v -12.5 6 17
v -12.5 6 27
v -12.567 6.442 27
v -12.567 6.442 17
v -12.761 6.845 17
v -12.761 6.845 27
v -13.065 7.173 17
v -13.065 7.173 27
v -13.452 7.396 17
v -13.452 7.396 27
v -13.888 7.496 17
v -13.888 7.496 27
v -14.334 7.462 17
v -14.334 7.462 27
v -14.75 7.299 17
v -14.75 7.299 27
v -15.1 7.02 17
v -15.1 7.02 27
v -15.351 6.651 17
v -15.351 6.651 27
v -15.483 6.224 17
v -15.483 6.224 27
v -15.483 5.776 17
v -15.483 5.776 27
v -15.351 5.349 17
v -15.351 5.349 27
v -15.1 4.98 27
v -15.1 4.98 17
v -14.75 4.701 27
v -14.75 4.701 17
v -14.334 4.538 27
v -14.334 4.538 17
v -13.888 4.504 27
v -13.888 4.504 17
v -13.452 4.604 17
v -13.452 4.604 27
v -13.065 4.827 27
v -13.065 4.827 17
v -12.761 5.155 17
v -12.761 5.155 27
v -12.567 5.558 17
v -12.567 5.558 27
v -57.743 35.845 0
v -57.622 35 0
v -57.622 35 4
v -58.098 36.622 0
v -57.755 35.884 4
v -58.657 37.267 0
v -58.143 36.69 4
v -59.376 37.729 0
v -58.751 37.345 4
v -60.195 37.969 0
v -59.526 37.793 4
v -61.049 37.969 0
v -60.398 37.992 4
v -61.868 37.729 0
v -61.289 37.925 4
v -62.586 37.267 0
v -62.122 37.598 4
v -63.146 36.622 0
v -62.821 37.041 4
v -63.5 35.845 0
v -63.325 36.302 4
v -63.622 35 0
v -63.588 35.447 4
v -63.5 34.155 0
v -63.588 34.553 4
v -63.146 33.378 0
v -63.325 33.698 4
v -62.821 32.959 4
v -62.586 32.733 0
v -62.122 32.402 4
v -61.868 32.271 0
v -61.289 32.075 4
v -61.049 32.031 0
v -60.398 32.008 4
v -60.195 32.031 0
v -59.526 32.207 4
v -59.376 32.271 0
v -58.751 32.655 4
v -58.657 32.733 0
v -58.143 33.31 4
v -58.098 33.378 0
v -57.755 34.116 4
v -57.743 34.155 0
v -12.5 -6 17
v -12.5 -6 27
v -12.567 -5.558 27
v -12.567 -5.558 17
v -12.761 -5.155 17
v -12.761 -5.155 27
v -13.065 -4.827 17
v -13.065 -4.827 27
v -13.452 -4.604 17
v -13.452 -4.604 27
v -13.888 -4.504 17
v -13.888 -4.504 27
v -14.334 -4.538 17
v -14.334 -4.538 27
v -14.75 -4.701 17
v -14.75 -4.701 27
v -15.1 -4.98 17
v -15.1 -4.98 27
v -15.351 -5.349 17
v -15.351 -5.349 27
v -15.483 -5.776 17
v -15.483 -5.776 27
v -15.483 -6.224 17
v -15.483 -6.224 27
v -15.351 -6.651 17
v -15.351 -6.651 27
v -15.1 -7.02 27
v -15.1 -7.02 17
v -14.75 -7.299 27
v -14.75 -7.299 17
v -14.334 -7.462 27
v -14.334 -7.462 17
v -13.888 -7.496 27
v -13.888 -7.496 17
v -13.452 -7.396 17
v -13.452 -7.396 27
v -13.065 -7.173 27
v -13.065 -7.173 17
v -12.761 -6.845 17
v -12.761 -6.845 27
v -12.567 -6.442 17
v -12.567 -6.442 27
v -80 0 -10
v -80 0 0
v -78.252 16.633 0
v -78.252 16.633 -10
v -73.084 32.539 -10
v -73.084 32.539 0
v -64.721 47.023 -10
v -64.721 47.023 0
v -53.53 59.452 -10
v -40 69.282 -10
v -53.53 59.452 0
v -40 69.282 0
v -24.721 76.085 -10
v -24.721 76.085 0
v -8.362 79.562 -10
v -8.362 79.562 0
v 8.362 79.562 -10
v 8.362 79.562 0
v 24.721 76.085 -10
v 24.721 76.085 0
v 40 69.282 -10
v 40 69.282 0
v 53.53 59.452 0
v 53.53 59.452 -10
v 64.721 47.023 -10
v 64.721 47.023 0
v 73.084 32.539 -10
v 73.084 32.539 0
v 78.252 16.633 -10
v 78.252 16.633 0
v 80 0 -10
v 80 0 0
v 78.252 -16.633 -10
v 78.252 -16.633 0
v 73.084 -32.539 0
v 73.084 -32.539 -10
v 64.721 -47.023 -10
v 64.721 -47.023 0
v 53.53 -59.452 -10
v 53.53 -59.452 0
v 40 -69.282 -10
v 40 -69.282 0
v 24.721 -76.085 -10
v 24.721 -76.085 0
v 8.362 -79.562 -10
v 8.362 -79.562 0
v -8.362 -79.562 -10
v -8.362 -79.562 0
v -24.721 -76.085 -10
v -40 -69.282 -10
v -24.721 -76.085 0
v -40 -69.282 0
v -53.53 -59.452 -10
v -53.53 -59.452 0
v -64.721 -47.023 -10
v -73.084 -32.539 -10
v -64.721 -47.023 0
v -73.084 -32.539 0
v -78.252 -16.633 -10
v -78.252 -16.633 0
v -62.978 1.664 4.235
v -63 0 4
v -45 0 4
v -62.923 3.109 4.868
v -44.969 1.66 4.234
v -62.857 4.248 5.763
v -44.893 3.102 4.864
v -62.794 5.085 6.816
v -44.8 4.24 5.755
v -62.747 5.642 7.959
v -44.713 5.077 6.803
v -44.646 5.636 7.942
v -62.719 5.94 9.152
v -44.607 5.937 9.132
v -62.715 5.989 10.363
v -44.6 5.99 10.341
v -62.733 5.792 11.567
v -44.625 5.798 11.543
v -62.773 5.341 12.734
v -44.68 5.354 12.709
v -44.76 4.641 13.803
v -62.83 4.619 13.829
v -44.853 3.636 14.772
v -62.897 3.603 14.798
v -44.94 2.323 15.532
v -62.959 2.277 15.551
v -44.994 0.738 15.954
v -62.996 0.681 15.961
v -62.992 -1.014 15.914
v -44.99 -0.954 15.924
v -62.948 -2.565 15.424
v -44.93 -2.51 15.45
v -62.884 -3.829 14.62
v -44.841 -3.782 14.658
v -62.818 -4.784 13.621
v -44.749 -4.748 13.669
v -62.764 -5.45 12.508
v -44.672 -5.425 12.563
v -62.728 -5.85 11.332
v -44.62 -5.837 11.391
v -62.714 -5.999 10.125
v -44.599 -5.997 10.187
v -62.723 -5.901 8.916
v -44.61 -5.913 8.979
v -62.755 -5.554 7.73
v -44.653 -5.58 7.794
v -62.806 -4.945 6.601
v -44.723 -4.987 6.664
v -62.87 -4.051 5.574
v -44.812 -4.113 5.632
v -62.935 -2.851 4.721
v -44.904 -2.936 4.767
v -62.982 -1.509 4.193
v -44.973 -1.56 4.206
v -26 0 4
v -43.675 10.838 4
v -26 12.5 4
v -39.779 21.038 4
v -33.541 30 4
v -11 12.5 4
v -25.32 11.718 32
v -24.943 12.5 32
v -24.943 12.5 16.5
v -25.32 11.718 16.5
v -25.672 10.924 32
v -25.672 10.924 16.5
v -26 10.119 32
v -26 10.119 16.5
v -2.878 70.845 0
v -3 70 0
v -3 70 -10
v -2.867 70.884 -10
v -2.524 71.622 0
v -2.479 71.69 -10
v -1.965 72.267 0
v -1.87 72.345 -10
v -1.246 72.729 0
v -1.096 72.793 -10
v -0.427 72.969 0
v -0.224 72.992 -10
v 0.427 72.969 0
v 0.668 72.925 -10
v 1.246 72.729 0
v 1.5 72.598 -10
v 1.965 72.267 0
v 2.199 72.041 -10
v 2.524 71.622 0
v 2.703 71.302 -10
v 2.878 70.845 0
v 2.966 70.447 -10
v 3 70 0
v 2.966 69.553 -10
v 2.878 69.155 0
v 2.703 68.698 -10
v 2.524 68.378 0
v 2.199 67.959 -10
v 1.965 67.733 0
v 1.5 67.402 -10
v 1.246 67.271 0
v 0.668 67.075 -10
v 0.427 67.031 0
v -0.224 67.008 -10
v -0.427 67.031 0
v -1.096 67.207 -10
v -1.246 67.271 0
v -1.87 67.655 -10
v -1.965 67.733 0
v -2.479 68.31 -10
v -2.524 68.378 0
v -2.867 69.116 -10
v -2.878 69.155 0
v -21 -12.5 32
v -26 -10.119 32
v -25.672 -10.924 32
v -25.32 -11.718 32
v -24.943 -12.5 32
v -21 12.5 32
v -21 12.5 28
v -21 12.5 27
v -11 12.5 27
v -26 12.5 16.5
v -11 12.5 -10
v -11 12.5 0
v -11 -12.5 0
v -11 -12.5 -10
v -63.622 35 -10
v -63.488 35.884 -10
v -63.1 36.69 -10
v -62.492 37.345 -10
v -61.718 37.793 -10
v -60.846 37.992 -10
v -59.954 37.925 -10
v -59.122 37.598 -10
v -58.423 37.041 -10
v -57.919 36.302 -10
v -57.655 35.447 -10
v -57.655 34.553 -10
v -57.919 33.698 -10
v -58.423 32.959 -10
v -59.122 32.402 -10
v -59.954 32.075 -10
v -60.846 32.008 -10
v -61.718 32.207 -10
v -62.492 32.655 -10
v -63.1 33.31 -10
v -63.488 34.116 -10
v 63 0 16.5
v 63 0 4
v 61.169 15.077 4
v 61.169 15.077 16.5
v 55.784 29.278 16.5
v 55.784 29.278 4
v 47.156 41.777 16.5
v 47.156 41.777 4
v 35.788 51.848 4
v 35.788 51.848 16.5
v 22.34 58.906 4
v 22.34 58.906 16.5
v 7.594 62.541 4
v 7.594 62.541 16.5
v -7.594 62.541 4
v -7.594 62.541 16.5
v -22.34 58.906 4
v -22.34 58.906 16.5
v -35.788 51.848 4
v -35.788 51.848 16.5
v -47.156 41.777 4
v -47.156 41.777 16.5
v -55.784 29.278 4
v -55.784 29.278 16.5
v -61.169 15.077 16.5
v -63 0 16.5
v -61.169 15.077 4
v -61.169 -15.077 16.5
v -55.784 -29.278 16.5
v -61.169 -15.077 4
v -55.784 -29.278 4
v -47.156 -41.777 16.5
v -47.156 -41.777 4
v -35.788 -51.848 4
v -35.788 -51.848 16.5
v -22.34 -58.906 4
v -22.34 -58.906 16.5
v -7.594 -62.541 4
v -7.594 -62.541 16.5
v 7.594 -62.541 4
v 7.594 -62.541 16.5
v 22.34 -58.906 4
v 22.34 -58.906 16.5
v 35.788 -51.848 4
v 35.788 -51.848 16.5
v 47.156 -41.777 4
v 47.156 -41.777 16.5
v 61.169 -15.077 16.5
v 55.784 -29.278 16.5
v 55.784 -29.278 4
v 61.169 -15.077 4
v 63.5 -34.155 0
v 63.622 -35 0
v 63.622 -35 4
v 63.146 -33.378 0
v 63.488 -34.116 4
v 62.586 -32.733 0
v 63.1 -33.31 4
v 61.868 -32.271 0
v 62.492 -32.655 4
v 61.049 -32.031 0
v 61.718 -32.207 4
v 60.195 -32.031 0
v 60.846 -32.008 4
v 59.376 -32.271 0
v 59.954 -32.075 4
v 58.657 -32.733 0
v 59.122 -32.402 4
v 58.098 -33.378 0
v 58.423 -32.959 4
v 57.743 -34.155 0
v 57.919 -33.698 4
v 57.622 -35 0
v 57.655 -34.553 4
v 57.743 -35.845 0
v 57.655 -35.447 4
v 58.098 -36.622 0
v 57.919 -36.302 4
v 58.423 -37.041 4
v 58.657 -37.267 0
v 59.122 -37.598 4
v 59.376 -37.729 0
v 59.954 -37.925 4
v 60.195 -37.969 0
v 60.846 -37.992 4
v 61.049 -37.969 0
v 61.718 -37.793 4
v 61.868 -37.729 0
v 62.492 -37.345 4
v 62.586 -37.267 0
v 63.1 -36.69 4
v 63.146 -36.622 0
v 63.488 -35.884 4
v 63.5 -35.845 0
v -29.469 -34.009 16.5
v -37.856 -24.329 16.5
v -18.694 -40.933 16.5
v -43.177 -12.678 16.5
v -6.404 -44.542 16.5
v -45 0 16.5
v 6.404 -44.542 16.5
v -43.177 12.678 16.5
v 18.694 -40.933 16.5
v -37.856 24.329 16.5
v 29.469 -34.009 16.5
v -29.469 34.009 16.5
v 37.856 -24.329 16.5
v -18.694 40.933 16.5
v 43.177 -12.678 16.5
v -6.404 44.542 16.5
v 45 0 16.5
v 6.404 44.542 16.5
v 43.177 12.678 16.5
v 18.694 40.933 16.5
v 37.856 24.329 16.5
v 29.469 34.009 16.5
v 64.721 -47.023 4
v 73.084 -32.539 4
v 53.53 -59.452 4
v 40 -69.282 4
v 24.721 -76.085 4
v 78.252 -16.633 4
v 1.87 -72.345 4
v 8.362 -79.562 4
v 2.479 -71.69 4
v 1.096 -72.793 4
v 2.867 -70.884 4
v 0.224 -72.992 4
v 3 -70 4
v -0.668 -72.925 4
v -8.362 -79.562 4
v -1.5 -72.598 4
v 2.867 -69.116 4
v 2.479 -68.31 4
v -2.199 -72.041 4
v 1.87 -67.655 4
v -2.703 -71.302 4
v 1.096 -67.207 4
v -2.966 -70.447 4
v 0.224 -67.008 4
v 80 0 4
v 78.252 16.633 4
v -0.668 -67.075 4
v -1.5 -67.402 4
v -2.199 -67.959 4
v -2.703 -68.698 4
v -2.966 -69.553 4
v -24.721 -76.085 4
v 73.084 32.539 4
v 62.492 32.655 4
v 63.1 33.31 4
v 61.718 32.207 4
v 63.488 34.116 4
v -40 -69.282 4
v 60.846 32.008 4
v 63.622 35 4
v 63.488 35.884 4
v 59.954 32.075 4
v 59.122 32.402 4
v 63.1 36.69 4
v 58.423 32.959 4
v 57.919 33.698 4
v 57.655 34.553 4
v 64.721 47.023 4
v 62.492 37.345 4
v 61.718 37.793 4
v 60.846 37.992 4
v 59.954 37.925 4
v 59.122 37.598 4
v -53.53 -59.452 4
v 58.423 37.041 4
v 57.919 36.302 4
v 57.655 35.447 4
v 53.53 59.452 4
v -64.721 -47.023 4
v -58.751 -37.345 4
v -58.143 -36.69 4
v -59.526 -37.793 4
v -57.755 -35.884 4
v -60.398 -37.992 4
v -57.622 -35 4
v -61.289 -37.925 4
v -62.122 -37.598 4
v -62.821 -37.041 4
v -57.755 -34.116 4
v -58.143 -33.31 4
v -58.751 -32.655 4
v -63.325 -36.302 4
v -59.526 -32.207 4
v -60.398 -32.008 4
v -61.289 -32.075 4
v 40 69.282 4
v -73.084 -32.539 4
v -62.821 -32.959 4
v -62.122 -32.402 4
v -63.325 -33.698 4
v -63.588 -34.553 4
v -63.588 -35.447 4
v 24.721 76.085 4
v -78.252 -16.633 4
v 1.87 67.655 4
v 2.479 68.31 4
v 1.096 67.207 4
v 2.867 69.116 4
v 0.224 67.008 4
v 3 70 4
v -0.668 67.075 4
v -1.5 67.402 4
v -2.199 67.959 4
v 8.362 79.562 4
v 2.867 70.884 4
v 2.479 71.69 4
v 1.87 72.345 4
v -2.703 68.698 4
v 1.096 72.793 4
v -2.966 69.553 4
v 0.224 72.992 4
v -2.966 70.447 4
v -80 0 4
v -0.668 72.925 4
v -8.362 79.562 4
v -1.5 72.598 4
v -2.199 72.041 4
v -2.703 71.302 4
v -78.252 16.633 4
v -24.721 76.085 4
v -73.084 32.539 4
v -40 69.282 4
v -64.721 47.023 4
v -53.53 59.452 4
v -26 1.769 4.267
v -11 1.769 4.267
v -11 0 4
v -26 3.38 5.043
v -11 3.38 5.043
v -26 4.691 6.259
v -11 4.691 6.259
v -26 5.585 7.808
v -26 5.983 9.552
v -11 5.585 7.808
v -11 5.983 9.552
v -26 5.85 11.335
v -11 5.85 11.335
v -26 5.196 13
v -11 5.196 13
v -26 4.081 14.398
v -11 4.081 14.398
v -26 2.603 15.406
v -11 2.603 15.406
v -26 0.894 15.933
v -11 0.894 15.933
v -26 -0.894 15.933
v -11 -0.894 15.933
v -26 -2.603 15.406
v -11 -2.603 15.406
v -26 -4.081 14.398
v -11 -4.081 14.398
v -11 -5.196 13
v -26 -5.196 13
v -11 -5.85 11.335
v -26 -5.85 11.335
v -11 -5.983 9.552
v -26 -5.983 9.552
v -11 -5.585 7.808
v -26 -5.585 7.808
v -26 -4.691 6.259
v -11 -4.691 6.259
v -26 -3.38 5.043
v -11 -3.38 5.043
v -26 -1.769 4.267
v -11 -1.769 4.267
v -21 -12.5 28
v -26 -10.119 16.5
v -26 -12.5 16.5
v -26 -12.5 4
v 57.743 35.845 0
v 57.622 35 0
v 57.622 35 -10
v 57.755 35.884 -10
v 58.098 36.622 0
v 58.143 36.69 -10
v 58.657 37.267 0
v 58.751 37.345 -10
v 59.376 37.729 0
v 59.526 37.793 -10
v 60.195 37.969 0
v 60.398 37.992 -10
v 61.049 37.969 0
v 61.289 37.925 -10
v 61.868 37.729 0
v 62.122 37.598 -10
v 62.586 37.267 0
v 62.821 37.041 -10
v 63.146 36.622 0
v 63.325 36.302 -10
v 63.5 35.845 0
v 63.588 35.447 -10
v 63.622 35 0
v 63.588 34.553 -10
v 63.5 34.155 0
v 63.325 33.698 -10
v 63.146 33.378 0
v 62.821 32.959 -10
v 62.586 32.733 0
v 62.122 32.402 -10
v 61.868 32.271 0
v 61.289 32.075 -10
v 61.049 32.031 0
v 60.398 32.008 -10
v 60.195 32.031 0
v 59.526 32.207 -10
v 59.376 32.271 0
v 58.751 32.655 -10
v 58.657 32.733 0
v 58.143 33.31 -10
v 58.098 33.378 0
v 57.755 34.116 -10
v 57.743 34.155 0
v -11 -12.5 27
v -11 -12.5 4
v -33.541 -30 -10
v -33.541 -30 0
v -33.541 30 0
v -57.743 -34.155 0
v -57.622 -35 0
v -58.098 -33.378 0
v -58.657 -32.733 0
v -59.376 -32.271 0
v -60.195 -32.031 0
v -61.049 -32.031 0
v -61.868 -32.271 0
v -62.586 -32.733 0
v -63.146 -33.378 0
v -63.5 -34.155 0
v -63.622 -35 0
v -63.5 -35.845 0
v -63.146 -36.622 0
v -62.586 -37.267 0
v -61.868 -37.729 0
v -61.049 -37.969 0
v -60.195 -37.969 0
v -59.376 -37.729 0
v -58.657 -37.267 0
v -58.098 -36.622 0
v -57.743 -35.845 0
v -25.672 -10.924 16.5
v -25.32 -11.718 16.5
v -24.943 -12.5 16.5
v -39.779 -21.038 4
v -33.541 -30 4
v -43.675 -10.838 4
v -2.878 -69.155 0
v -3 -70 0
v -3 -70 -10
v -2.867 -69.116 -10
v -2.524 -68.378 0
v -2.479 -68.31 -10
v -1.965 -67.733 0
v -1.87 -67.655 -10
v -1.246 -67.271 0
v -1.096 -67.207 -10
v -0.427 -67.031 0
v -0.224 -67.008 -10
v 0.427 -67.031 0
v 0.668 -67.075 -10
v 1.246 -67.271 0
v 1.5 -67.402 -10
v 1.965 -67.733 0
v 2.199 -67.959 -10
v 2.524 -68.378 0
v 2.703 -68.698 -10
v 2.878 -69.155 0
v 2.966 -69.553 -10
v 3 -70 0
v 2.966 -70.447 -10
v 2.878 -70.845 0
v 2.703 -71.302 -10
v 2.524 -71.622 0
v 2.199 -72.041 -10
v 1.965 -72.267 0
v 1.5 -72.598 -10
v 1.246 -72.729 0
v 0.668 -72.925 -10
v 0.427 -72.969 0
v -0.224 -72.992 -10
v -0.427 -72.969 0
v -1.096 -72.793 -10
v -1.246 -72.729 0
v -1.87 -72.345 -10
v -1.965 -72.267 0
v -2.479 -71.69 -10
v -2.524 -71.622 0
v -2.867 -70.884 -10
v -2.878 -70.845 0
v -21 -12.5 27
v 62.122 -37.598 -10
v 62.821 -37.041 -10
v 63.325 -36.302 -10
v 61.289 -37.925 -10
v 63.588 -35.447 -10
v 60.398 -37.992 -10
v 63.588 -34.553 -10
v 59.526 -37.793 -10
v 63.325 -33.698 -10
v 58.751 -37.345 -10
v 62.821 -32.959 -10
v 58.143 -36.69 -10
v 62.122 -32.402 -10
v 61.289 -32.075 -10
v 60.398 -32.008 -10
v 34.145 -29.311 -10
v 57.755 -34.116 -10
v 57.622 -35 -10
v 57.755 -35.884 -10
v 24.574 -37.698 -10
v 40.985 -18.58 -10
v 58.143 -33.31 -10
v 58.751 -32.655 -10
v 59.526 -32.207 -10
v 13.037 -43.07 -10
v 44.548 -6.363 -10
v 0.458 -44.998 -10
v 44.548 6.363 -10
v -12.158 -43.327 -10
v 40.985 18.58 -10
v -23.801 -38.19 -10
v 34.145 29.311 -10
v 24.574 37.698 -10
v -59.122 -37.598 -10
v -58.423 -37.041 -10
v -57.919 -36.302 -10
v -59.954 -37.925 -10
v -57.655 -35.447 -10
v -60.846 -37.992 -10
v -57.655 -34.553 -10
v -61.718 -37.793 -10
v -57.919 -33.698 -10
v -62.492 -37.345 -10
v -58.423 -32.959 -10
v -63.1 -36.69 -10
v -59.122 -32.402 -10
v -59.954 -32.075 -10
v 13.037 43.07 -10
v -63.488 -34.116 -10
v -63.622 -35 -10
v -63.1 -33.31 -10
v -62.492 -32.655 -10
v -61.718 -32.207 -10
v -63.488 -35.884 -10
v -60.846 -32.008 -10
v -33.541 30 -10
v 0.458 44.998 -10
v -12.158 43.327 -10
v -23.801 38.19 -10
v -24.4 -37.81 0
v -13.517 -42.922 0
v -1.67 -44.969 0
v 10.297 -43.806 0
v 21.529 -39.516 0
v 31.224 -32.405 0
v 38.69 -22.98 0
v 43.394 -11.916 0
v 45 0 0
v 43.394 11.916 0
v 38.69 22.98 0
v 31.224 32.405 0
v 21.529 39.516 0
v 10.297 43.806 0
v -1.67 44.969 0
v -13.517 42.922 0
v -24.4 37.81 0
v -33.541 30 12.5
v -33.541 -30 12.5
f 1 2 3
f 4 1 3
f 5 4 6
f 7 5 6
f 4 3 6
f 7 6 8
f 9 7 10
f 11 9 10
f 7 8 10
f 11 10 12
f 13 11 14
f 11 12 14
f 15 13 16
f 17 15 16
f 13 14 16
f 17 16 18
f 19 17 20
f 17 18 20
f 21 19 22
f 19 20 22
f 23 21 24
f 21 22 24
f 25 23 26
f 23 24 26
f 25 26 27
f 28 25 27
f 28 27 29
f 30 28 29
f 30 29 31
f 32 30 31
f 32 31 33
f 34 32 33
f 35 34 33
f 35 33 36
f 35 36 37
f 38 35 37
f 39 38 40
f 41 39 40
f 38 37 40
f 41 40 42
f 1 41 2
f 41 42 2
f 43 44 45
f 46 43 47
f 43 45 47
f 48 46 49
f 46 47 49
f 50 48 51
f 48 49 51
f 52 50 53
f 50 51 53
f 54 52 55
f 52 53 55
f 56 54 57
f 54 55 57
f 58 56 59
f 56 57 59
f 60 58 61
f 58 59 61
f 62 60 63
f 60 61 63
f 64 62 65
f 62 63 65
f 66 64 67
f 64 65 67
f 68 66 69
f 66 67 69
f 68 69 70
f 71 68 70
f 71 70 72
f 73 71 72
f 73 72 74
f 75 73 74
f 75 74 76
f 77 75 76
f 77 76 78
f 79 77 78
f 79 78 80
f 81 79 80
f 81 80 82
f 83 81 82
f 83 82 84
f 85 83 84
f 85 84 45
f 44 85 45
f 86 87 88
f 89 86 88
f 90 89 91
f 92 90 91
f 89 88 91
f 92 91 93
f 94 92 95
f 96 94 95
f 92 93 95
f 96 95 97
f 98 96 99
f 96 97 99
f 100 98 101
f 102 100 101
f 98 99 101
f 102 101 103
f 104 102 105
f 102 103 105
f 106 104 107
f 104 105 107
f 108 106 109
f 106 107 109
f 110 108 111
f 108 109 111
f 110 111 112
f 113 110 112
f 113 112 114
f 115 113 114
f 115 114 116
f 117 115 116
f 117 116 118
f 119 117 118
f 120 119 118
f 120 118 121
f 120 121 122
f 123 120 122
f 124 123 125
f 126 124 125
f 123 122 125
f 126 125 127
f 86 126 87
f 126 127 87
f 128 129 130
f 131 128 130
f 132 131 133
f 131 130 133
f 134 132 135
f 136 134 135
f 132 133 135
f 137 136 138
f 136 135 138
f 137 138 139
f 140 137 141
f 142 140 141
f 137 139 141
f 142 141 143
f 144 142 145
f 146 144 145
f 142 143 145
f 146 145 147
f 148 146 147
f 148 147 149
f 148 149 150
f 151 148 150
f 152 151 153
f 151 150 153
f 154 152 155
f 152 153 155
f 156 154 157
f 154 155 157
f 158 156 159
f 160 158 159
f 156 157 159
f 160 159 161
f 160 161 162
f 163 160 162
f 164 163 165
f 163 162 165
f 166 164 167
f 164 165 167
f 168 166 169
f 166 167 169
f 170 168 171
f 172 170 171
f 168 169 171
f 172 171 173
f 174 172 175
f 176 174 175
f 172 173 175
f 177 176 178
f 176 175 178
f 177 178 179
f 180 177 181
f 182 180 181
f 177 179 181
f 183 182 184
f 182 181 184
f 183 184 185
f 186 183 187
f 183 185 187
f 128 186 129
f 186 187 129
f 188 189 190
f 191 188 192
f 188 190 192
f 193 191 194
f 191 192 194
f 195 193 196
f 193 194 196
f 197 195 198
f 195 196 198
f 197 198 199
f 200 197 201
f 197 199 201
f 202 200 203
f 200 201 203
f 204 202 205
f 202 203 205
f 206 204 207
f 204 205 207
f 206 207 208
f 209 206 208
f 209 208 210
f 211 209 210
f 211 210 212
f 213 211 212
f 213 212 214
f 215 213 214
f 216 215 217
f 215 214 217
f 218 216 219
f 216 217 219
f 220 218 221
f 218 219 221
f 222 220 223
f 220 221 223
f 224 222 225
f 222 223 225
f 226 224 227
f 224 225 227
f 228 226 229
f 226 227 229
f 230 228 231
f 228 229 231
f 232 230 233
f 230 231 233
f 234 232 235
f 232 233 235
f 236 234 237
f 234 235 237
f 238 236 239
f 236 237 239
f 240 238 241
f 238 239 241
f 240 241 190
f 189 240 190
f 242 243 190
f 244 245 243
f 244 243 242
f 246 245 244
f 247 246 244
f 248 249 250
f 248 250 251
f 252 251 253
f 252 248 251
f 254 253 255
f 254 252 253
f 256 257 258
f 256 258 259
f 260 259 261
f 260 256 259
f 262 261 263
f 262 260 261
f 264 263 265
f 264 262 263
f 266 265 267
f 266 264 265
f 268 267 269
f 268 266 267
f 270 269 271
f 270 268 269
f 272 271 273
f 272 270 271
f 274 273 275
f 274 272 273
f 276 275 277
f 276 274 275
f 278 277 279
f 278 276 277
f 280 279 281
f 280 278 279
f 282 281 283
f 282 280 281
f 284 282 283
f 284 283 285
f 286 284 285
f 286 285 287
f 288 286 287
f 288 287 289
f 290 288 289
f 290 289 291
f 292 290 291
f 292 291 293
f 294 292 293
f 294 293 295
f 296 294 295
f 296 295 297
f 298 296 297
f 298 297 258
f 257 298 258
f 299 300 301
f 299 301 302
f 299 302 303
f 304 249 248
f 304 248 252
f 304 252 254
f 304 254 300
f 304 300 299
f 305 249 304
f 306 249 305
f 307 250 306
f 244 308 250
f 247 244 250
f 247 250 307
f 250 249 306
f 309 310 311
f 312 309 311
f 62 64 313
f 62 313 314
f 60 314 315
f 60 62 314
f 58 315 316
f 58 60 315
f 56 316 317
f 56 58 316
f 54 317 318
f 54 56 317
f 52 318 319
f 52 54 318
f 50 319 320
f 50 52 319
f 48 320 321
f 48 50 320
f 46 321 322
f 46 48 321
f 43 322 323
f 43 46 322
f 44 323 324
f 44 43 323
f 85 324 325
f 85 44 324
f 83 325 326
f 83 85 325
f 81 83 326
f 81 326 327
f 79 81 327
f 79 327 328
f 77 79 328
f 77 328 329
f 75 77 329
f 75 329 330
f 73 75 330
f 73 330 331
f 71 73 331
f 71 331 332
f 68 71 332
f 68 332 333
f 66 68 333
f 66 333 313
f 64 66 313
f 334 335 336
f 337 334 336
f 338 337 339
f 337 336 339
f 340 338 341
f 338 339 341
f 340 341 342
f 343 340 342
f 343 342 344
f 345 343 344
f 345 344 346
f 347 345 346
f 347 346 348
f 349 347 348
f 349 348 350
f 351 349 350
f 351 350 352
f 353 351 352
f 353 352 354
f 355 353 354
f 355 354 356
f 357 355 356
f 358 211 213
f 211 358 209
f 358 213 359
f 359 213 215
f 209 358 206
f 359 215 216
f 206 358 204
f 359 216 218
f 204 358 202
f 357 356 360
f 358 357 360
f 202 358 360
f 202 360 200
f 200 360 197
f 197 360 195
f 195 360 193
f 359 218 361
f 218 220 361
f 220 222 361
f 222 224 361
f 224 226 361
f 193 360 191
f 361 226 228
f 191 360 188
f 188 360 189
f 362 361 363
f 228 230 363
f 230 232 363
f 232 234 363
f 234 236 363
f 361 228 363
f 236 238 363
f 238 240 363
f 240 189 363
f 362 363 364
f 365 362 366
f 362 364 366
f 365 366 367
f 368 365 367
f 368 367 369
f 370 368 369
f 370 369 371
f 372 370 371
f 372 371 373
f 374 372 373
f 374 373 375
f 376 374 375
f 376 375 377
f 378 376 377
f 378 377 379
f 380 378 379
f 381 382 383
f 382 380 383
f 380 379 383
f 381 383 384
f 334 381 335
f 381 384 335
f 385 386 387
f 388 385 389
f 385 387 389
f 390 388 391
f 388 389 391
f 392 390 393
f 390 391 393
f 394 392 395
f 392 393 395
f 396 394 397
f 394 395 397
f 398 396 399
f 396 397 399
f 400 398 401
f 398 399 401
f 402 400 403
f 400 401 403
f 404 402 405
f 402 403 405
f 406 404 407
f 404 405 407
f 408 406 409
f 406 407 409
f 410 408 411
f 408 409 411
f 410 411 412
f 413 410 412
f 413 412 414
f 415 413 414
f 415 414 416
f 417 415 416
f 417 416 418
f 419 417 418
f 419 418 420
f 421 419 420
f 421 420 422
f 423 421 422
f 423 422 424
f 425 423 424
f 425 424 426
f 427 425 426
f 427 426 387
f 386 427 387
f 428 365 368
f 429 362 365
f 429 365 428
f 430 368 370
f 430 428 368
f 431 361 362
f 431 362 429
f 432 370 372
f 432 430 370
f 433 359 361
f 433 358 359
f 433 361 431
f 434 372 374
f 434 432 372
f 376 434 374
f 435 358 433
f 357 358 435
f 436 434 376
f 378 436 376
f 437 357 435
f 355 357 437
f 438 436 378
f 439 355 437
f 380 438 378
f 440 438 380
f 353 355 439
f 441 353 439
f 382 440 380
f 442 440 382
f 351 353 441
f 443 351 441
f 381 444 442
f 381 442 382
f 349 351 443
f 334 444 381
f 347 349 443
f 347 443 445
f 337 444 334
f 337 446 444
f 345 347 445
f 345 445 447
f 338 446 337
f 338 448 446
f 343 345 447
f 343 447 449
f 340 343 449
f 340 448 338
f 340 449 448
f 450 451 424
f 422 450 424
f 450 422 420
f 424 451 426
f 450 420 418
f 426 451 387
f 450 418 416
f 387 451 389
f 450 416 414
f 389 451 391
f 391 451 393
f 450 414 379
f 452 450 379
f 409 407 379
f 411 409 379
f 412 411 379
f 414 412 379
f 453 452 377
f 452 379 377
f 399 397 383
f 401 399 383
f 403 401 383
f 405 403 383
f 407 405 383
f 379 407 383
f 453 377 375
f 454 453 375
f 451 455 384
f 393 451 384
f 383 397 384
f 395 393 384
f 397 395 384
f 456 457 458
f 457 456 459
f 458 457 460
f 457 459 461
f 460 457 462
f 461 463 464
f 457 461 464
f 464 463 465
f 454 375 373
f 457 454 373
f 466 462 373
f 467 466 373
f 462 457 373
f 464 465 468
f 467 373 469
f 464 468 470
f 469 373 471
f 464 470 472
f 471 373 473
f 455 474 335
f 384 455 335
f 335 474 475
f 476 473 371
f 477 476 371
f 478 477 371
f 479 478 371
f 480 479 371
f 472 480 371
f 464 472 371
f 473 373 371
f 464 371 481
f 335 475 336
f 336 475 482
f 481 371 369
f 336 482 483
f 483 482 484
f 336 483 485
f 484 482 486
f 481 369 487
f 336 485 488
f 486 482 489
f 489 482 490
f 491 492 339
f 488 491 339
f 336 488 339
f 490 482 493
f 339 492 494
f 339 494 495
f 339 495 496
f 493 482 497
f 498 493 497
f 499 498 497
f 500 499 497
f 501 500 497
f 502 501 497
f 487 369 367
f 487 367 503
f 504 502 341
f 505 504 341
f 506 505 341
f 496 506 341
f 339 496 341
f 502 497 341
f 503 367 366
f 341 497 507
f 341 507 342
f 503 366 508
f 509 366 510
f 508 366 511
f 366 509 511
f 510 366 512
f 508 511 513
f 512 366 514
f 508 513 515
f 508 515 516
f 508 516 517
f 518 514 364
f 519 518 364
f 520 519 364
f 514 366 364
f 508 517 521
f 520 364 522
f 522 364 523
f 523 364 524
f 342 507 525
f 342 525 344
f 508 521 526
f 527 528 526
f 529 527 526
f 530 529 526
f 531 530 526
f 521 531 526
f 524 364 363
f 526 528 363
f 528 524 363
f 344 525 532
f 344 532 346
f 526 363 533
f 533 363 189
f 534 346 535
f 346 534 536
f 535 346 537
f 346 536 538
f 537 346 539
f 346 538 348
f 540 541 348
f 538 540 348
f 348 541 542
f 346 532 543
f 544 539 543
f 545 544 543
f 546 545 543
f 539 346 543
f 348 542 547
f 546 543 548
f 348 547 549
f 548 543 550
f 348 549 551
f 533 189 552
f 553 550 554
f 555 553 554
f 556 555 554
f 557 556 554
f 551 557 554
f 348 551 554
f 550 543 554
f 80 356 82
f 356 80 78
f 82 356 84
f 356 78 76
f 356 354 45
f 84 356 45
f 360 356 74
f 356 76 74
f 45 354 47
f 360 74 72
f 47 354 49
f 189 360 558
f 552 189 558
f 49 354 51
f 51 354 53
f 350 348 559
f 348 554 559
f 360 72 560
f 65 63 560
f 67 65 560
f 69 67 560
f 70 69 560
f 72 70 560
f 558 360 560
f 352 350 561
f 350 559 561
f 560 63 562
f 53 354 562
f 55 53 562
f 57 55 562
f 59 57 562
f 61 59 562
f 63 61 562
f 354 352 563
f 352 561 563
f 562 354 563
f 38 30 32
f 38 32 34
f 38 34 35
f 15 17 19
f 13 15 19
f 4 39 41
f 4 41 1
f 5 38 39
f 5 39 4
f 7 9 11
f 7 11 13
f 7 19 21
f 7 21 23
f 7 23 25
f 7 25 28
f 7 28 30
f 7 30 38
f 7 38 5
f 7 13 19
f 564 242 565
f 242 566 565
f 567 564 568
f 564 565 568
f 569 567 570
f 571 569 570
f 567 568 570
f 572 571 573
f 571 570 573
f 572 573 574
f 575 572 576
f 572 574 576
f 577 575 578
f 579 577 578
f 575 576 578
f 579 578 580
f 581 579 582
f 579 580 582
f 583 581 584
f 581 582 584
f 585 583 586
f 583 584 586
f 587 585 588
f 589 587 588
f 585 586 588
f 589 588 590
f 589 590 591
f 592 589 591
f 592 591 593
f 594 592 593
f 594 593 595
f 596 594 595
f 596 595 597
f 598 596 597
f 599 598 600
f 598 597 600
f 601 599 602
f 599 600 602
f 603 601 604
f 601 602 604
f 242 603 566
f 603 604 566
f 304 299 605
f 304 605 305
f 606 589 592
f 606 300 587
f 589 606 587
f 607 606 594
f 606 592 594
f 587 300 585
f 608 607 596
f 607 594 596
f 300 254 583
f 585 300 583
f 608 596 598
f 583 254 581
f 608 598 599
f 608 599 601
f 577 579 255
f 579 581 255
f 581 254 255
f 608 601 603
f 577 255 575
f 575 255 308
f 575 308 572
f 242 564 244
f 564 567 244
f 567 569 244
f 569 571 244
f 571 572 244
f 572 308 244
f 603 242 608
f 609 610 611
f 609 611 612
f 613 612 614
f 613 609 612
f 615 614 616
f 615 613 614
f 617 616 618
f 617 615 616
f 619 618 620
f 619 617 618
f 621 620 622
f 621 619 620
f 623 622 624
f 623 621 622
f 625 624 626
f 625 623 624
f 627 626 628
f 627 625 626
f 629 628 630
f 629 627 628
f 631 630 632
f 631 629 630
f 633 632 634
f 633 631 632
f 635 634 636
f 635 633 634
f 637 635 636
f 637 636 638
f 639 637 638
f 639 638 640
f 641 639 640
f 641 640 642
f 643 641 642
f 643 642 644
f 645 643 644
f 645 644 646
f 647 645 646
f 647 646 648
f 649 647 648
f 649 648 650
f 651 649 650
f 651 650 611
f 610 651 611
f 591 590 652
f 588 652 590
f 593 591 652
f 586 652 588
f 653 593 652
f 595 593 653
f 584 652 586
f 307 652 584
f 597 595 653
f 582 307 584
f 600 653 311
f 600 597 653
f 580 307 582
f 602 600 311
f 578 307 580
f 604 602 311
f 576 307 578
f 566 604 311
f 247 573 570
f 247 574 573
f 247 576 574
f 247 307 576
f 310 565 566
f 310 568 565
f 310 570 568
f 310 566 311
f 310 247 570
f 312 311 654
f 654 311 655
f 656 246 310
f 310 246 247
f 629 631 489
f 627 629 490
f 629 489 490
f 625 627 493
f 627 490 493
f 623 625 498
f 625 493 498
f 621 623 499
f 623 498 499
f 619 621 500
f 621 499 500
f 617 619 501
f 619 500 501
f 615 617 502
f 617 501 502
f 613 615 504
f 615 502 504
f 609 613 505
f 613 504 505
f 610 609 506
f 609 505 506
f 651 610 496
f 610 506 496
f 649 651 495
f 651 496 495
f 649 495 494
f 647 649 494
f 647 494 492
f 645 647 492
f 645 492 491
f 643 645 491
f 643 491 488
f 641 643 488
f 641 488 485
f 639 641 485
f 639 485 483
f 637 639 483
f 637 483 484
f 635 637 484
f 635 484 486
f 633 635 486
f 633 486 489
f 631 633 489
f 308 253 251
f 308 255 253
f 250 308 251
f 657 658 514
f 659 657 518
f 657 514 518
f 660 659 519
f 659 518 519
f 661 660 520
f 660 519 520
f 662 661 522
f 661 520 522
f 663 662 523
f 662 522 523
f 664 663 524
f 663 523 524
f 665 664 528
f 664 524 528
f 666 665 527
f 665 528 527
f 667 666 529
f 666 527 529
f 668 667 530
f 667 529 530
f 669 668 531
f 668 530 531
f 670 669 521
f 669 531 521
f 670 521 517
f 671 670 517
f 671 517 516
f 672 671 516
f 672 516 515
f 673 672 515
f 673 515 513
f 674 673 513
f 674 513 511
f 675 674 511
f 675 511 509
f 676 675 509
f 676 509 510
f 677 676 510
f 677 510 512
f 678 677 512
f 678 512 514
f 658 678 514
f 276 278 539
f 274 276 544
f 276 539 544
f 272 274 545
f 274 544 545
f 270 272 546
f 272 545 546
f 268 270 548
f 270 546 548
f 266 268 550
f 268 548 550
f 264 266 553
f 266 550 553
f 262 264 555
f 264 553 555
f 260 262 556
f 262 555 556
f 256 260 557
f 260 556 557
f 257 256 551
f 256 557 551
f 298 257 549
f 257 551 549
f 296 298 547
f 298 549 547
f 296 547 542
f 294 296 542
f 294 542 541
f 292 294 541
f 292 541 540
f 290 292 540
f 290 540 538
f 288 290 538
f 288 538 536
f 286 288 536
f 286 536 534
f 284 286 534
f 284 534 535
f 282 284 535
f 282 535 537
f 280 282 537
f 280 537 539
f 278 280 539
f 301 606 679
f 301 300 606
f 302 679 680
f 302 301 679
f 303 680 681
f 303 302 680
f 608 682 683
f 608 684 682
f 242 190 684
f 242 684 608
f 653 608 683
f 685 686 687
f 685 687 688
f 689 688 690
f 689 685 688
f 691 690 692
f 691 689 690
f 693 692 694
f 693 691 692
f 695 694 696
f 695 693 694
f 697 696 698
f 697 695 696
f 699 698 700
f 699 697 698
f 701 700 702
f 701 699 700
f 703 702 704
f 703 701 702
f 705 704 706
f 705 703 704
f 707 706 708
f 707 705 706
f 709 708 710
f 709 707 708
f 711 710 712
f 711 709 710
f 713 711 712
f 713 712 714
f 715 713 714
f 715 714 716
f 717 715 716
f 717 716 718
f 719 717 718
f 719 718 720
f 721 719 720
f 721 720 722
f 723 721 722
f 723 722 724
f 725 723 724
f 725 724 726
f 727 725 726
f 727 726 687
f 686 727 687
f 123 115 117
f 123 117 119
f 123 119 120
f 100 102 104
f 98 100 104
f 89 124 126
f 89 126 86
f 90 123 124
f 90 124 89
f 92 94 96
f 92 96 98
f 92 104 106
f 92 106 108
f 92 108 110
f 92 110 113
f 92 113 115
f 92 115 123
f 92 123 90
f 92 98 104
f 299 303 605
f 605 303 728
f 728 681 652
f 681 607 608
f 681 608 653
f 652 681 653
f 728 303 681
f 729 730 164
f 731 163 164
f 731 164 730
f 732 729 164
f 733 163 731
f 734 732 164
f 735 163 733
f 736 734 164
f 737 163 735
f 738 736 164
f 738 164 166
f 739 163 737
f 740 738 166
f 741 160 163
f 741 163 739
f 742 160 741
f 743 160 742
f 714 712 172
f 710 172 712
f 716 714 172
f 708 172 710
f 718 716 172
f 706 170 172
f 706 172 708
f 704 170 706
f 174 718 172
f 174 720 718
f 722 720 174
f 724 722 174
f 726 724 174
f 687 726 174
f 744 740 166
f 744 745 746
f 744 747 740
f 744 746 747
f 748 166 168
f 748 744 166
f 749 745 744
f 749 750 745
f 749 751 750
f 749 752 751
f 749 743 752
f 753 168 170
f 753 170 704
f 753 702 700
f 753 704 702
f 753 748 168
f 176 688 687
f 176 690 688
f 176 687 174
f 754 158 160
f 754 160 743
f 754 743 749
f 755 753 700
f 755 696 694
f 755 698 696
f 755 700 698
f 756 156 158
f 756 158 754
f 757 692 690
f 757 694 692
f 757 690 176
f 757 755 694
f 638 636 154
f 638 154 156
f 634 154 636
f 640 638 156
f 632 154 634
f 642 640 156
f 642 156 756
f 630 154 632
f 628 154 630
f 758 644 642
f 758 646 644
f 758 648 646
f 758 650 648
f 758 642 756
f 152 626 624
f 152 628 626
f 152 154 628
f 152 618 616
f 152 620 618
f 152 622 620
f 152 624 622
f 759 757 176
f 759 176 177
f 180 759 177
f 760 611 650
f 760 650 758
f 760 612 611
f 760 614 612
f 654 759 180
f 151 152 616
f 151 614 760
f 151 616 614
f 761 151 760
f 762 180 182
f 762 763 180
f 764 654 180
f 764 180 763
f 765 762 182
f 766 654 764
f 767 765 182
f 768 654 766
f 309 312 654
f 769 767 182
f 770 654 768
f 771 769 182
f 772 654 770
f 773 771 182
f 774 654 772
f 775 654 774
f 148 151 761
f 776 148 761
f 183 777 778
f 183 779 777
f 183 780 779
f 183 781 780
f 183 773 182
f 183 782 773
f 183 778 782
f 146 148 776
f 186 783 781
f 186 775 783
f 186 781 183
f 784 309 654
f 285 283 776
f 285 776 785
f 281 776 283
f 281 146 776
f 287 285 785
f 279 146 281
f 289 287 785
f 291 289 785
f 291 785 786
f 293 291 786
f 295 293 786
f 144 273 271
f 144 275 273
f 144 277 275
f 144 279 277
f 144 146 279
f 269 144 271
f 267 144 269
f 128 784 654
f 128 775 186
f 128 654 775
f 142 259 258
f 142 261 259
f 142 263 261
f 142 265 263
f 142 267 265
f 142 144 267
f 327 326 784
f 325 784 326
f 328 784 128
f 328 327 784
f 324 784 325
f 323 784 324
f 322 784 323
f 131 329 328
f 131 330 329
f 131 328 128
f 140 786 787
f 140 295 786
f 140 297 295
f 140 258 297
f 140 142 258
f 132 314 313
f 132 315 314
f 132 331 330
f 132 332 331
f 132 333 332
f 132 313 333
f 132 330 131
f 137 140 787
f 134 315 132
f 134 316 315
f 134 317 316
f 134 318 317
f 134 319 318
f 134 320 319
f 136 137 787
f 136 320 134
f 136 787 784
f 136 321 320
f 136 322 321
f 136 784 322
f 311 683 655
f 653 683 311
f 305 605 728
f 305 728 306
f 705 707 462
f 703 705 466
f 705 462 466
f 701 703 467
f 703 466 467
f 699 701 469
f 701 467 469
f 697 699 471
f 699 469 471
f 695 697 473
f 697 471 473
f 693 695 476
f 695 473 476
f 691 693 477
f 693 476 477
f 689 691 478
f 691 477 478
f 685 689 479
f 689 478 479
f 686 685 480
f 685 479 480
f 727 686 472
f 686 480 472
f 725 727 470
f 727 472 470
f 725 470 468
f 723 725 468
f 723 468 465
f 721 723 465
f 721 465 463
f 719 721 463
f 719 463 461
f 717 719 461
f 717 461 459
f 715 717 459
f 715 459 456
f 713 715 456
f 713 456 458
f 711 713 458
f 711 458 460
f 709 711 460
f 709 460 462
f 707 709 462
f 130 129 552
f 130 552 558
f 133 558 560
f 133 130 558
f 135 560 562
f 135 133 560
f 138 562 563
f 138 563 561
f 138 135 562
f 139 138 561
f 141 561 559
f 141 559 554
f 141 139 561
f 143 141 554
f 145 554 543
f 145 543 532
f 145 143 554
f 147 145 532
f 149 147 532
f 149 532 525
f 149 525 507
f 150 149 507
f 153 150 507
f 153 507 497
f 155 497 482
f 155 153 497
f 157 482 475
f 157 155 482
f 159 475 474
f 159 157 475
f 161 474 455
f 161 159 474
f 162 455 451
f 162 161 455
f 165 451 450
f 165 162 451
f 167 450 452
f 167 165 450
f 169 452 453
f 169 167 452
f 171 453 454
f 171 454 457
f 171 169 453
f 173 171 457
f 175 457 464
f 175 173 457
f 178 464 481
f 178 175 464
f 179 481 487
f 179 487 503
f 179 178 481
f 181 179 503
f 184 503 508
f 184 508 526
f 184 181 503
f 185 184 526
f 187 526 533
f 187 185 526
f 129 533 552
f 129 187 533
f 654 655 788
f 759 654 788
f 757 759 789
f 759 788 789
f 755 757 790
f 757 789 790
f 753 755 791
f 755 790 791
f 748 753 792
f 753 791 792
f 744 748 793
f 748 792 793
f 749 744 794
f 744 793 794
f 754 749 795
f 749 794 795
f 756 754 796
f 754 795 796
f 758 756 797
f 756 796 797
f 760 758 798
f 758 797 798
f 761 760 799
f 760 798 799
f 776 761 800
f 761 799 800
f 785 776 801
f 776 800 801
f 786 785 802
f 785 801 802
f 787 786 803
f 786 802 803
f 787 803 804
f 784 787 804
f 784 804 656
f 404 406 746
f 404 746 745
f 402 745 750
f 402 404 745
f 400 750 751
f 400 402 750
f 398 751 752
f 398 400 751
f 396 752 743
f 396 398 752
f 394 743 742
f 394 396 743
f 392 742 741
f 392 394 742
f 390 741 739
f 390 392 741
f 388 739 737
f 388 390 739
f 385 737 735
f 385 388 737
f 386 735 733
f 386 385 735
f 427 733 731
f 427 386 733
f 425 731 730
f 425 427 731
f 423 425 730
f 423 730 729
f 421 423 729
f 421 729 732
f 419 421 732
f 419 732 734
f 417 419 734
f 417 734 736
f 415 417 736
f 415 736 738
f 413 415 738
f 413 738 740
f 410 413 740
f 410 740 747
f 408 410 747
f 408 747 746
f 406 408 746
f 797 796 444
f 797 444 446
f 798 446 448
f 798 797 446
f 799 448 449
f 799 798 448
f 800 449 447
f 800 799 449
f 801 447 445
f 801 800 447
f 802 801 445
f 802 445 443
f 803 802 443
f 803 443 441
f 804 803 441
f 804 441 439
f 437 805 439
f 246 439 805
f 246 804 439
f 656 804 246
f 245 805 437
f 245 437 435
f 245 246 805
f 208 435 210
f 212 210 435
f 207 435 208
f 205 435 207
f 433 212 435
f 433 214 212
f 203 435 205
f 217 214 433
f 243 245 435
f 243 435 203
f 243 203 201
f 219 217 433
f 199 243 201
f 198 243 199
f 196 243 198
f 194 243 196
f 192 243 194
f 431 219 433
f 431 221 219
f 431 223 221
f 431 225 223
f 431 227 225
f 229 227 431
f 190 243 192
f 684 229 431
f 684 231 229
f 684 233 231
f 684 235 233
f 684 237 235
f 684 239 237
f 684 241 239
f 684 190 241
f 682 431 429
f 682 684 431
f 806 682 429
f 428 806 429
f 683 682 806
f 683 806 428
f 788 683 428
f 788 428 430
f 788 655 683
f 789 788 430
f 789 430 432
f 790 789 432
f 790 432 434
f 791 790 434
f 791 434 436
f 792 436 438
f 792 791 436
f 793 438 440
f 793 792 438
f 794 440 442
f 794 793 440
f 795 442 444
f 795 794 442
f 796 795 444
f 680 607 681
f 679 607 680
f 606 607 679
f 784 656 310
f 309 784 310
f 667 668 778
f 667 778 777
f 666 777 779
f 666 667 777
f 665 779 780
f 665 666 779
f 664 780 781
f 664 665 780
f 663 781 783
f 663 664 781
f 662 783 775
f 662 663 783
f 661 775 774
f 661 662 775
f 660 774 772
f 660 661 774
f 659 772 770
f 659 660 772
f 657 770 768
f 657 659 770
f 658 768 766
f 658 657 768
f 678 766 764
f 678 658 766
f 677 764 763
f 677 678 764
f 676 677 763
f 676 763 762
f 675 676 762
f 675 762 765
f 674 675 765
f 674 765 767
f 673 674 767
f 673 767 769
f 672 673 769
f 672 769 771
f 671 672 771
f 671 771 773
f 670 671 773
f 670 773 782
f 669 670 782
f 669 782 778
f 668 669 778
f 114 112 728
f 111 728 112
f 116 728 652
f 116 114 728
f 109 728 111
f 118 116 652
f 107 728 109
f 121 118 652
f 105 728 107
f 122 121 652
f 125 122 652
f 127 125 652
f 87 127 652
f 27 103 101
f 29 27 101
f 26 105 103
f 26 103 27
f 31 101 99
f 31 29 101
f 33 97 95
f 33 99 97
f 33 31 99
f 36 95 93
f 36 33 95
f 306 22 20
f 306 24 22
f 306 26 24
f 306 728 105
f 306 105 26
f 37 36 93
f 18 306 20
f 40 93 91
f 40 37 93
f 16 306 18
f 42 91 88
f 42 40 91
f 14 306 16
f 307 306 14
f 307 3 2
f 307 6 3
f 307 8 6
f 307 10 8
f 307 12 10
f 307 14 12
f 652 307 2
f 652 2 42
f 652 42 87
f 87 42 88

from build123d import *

# Parameters (mm, degrees)
SKETCH1_R            = 70
SKETCH1_R_2          = 45
BOSS_EXTRUDE1_DEPTH  = 4
SKETCH3_R            = 60
SKETCH3_R_2          = 45
BOSS_EXTRUDE4_DEPTH  = 32
SKETCH6_W            = 16
SKETCH6_H            = 10
SKETCH6_W_2          = 34
BOSS_EXTRUDE5_DEPTH  = 12.5
SKETCH10_W           = 15
SKETCH10_H           = 22
BOSS_EXTRUDE6_DEPTH  = 12.5
SKETCH11_W           = 34
SKETCH11_H           = 4
BOSS_EXTRUDE7_DEPTH  = 30
SKETCH12_W           = 17.229041164
SKETCH12_H           = 10
CUT_EXTRUDE3_DEPTH   = 12.5
CUT_EXTRUDE4_DEPTH   = 12.5
CUT_EXTRUDE5_DEPTH   = 12.5
SKETCH20_W           = 10
SKETCH20_H           = 25
CUT_EXTRUDE11_DEPTH  = 4
SKETCH21_R           = 45
SKETCH21_R_2         = 32.5
BOSS_EXTRUDE8_DEPTH  = 15
SKETCH22_W           = 17.163263372
SKETCH22_H           = 25
CUT_EXTRUDE12_DEPTH  = 5
SKETCH25_R           = 63
SKETCH25_R_2         = 60
BOSS_EXTRUDE9_DEPTH  = 50
SKETCH26_R           = 80
SKETCH26_R_2         = 70
BOSS_EXTRUDE10_DEPTH = 4
SKETCH29_R           = 3
CUT_EXTRUDE14_DEPTH  = 5
SKETCH30_R           = 80
SKETCH30_R_2         = 3
BOSS_EXTRUDE11_DEPTH = 10
SKETCH16_R           = 6
CUT_EXTRUDE10_DEPTH  = 100
SKETCH31_W           = 42
SKETCH31_H           = 25
CUT_EXTRUDE15_DEPTH  = 1
SKETCH33_R           = 81.797304038
SKETCH33_R_2         = 27.899813831
CUT_EXTRUDE17_DEPTH  = 37.5
SKETCH34_R           = 1.5
CUT_EXTRUDE18_DEPTH  = 10


with BuildPart() as part:
    # Sketch1 → Boss-Extrude1 (new body)
    with BuildSketch(Plane.XY):
        Circle(SKETCH1_R)
        Circle(SKETCH1_R_2, mode=Mode.SUBTRACT)
    extrude(amount=BOSS_EXTRUDE1_DEPTH)

    # Sketch3 → Boss-Extrude4 (add)
    with BuildSketch(Plane.XY):
        Circle(SKETCH3_R)
        Circle(SKETCH3_R_2, mode=Mode.SUBTRACT)
    extrude(amount=BOSS_EXTRUDE4_DEPTH)

    # Sketch6 → Boss-Extrude5 (add, symmetric)
    with BuildSketch(Plane(origin=(0, 0, 0), x_dir=(1, 0, 0), z_dir=(0, 1, 0))):
        with Locations((37, -27)):
            Rectangle(SKETCH6_W, SKETCH6_H)
        with Locations((-28, -27)):
            Rectangle(SKETCH6_W_2, SKETCH6_H)
    extrude(amount=BOSS_EXTRUDE5_DEPTH, both=True)

    # Sketch10 → Boss-Extrude6 (add, symmetric)
    with BuildSketch(Plane(origin=(0, 0, 0), x_dir=(1, 0, 0), z_dir=(0, 1, 0))):
        with Locations((-18.5, -11)):
            Rectangle(SKETCH10_W, SKETCH10_H)
    extrude(amount=BOSS_EXTRUDE6_DEPTH, both=True)

    # Sketch11 → Boss-Extrude7 (add, symmetric)
    with BuildSketch(Plane(origin=(0, 0, 0), x_dir=(1, 0, 0), z_dir=(0, 1, 0))):
        with Locations((-28, -2)):
            Rectangle(SKETCH11_W, SKETCH11_H)
    extrude(amount=BOSS_EXTRUDE7_DEPTH, both=True)

    # Sketch12 → Cut-Extrude3 (cut, symmetric)
    with BuildSketch(Plane(origin=(0, 0, 0), x_dir=(1, 0, 0), z_dir=(0, 1, 0))):
        with Locations((-34.614520582, -27)):
            Rectangle(SKETCH12_W, SKETCH12_H)
    extrude(amount=CUT_EXTRUDE3_DEPTH, both=True, mode=Mode.SUBTRACT)

    # Sketch13 → Cut-Extrude4 (cut, symmetric)
    with BuildSketch(Plane.XY):
        Polygon((-33.541019662, 30), (-11, 12.5), (-11, 30), align=None)
    extrude(amount=CUT_EXTRUDE4_DEPTH, both=True, mode=Mode.SUBTRACT)

    # Sketch14 → Cut-Extrude5 (cut, symmetric)
    with BuildSketch(Plane.XY):
        Polygon((-33.541019662, -30), (-11, -12.5), (-11, -30), align=None)
    extrude(amount=CUT_EXTRUDE5_DEPTH, both=True, mode=Mode.SUBTRACT)

    # Sketch20 → Cut-Extrude11 (cut)
    with BuildSketch(Plane.XY.offset(32)):
        with Locations((-16, 0)):
            Rectangle(SKETCH20_W, SKETCH20_H)
        with Locations((34, 0)):
            Rectangle(SKETCH20_W, SKETCH20_H)
    extrude(amount=-CUT_EXTRUDE11_DEPTH, mode=Mode.SUBTRACT)

    # Sketch21 → Boss-Extrude8 (add)
    with BuildSketch(Plane.XY.offset(32)):
        Circle(SKETCH21_R)
        Circle(SKETCH21_R_2, mode=Mode.SUBTRACT)
    extrude(amount=-BOSS_EXTRUDE8_DEPTH)

    # Sketch22 → Cut-Extrude12 (cut)
    with BuildSketch(Plane.XY.offset(32)):
        with Locations((34.647409478, 0)):
            Rectangle(SKETCH22_W, SKETCH22_H)
    extrude(amount=-CUT_EXTRUDE12_DEPTH, mode=Mode.SUBTRACT)

    # Sketch25 → Boss-Extrude9 (add)
    with BuildSketch(Plane.XY.offset(4)):
        Circle(SKETCH25_R)
        Circle(SKETCH25_R_2, mode=Mode.SUBTRACT)
    extrude(amount=BOSS_EXTRUDE9_DEPTH)

    # Sketch26 → Boss-Extrude10 (add)
    with BuildSketch(Plane(origin=(0, 0, 0), x_dir=(-1, 0, 0), z_dir=(0, 0, -1))):
        Circle(SKETCH26_R)
        Circle(SKETCH26_R_2, mode=Mode.SUBTRACT)
    extrude(amount=-BOSS_EXTRUDE10_DEPTH)

    # Sketch29 → Cut-Extrude14 (cut)
    with BuildSketch(Plane.XY.offset(4)):
        with Locations((0, 70)):
            Circle(SKETCH29_R)
        with Locations((60.621778265, 35)):
            Circle(SKETCH29_R)
        with Locations((60.621778265, -35)):
            Circle(SKETCH29_R)
        with Locations((0, -70)):
            Circle(SKETCH29_R)
        with Locations((-60.621778265, -35)):
            Circle(SKETCH29_R)
        with Locations((-60.621778265, 35)):
            Circle(SKETCH29_R)
    extrude(amount=-CUT_EXTRUDE14_DEPTH, mode=Mode.SUBTRACT)

    # Sketch30 → Boss-Extrude11 (add)
    with BuildSketch(Plane(origin=(0, 0, 0), x_dir=(-1, 0, 0), z_dir=(0, 0, -1))):
        Circle(SKETCH30_R)
        with Locations((-60.621778265, 35)):
            Circle(SKETCH30_R_2, mode=Mode.SUBTRACT)
        with Locations((-60.621778265, -35)):
            Circle(SKETCH30_R_2, mode=Mode.SUBTRACT)
        with Locations((0, -70)):
            Circle(SKETCH30_R_2, mode=Mode.SUBTRACT)
        with Locations((60.621778265, -35)):
            Circle(SKETCH30_R_2, mode=Mode.SUBTRACT)
        with Locations((60.621778265, 35)):
            Circle(SKETCH30_R_2, mode=Mode.SUBTRACT)
        with Locations((0, 70)):
            Circle(SKETCH30_R_2, mode=Mode.SUBTRACT)
        with BuildLine():
            Line((11, -12.5), (33.541019662, -30))
            ThreePointArc((33.541019662, -30), (-45, 0), (33.541019662, 30))
            Line((33.541019662, 30), (11, 12.5))
            Line((11, 12.5), (11, -12.5))
        make_face(mode=Mode.SUBTRACT)
    extrude(amount=BOSS_EXTRUDE11_DEPTH)

    # Sketch16 → Cut-Extrude10 (cut)
    with BuildSketch(Plane(origin=(-11, 0, 0), x_dir=(0, 0, -1), z_dir=(1, 0, 0))):
        with Locations((-10, 0)):
            Circle(SKETCH16_R)
    extrude(amount=-CUT_EXTRUDE10_DEPTH, mode=Mode.SUBTRACT)

    # Sketch31 → Cut-Extrude15 (cut)
    with BuildSketch(Plane.XY.offset(28)):
        Rectangle(SKETCH31_W, SKETCH31_H)
    extrude(amount=-CUT_EXTRUDE15_DEPTH, mode=Mode.SUBTRACT)

    # Sketch33 → Cut-Extrude17 (cut)
    with BuildSketch(Plane.XY.offset(54)):
        Circle(SKETCH33_R)
        Circle(SKETCH33_R_2, mode=Mode.SUBTRACT)
    extrude(amount=-CUT_EXTRUDE17_DEPTH, mode=Mode.SUBTRACT)

    # Sketch34 → Cut-Extrude18 (cut)
    with BuildSketch(Plane.XY.offset(27)):
        with Locations((-14, 6)):
            Circle(SKETCH34_R)
        with Locations((-14, -6)):
            Circle(SKETCH34_R)
    extrude(amount=-CUT_EXTRUDE18_DEPTH, mode=Mode.SUBTRACT)


solid = part.part
